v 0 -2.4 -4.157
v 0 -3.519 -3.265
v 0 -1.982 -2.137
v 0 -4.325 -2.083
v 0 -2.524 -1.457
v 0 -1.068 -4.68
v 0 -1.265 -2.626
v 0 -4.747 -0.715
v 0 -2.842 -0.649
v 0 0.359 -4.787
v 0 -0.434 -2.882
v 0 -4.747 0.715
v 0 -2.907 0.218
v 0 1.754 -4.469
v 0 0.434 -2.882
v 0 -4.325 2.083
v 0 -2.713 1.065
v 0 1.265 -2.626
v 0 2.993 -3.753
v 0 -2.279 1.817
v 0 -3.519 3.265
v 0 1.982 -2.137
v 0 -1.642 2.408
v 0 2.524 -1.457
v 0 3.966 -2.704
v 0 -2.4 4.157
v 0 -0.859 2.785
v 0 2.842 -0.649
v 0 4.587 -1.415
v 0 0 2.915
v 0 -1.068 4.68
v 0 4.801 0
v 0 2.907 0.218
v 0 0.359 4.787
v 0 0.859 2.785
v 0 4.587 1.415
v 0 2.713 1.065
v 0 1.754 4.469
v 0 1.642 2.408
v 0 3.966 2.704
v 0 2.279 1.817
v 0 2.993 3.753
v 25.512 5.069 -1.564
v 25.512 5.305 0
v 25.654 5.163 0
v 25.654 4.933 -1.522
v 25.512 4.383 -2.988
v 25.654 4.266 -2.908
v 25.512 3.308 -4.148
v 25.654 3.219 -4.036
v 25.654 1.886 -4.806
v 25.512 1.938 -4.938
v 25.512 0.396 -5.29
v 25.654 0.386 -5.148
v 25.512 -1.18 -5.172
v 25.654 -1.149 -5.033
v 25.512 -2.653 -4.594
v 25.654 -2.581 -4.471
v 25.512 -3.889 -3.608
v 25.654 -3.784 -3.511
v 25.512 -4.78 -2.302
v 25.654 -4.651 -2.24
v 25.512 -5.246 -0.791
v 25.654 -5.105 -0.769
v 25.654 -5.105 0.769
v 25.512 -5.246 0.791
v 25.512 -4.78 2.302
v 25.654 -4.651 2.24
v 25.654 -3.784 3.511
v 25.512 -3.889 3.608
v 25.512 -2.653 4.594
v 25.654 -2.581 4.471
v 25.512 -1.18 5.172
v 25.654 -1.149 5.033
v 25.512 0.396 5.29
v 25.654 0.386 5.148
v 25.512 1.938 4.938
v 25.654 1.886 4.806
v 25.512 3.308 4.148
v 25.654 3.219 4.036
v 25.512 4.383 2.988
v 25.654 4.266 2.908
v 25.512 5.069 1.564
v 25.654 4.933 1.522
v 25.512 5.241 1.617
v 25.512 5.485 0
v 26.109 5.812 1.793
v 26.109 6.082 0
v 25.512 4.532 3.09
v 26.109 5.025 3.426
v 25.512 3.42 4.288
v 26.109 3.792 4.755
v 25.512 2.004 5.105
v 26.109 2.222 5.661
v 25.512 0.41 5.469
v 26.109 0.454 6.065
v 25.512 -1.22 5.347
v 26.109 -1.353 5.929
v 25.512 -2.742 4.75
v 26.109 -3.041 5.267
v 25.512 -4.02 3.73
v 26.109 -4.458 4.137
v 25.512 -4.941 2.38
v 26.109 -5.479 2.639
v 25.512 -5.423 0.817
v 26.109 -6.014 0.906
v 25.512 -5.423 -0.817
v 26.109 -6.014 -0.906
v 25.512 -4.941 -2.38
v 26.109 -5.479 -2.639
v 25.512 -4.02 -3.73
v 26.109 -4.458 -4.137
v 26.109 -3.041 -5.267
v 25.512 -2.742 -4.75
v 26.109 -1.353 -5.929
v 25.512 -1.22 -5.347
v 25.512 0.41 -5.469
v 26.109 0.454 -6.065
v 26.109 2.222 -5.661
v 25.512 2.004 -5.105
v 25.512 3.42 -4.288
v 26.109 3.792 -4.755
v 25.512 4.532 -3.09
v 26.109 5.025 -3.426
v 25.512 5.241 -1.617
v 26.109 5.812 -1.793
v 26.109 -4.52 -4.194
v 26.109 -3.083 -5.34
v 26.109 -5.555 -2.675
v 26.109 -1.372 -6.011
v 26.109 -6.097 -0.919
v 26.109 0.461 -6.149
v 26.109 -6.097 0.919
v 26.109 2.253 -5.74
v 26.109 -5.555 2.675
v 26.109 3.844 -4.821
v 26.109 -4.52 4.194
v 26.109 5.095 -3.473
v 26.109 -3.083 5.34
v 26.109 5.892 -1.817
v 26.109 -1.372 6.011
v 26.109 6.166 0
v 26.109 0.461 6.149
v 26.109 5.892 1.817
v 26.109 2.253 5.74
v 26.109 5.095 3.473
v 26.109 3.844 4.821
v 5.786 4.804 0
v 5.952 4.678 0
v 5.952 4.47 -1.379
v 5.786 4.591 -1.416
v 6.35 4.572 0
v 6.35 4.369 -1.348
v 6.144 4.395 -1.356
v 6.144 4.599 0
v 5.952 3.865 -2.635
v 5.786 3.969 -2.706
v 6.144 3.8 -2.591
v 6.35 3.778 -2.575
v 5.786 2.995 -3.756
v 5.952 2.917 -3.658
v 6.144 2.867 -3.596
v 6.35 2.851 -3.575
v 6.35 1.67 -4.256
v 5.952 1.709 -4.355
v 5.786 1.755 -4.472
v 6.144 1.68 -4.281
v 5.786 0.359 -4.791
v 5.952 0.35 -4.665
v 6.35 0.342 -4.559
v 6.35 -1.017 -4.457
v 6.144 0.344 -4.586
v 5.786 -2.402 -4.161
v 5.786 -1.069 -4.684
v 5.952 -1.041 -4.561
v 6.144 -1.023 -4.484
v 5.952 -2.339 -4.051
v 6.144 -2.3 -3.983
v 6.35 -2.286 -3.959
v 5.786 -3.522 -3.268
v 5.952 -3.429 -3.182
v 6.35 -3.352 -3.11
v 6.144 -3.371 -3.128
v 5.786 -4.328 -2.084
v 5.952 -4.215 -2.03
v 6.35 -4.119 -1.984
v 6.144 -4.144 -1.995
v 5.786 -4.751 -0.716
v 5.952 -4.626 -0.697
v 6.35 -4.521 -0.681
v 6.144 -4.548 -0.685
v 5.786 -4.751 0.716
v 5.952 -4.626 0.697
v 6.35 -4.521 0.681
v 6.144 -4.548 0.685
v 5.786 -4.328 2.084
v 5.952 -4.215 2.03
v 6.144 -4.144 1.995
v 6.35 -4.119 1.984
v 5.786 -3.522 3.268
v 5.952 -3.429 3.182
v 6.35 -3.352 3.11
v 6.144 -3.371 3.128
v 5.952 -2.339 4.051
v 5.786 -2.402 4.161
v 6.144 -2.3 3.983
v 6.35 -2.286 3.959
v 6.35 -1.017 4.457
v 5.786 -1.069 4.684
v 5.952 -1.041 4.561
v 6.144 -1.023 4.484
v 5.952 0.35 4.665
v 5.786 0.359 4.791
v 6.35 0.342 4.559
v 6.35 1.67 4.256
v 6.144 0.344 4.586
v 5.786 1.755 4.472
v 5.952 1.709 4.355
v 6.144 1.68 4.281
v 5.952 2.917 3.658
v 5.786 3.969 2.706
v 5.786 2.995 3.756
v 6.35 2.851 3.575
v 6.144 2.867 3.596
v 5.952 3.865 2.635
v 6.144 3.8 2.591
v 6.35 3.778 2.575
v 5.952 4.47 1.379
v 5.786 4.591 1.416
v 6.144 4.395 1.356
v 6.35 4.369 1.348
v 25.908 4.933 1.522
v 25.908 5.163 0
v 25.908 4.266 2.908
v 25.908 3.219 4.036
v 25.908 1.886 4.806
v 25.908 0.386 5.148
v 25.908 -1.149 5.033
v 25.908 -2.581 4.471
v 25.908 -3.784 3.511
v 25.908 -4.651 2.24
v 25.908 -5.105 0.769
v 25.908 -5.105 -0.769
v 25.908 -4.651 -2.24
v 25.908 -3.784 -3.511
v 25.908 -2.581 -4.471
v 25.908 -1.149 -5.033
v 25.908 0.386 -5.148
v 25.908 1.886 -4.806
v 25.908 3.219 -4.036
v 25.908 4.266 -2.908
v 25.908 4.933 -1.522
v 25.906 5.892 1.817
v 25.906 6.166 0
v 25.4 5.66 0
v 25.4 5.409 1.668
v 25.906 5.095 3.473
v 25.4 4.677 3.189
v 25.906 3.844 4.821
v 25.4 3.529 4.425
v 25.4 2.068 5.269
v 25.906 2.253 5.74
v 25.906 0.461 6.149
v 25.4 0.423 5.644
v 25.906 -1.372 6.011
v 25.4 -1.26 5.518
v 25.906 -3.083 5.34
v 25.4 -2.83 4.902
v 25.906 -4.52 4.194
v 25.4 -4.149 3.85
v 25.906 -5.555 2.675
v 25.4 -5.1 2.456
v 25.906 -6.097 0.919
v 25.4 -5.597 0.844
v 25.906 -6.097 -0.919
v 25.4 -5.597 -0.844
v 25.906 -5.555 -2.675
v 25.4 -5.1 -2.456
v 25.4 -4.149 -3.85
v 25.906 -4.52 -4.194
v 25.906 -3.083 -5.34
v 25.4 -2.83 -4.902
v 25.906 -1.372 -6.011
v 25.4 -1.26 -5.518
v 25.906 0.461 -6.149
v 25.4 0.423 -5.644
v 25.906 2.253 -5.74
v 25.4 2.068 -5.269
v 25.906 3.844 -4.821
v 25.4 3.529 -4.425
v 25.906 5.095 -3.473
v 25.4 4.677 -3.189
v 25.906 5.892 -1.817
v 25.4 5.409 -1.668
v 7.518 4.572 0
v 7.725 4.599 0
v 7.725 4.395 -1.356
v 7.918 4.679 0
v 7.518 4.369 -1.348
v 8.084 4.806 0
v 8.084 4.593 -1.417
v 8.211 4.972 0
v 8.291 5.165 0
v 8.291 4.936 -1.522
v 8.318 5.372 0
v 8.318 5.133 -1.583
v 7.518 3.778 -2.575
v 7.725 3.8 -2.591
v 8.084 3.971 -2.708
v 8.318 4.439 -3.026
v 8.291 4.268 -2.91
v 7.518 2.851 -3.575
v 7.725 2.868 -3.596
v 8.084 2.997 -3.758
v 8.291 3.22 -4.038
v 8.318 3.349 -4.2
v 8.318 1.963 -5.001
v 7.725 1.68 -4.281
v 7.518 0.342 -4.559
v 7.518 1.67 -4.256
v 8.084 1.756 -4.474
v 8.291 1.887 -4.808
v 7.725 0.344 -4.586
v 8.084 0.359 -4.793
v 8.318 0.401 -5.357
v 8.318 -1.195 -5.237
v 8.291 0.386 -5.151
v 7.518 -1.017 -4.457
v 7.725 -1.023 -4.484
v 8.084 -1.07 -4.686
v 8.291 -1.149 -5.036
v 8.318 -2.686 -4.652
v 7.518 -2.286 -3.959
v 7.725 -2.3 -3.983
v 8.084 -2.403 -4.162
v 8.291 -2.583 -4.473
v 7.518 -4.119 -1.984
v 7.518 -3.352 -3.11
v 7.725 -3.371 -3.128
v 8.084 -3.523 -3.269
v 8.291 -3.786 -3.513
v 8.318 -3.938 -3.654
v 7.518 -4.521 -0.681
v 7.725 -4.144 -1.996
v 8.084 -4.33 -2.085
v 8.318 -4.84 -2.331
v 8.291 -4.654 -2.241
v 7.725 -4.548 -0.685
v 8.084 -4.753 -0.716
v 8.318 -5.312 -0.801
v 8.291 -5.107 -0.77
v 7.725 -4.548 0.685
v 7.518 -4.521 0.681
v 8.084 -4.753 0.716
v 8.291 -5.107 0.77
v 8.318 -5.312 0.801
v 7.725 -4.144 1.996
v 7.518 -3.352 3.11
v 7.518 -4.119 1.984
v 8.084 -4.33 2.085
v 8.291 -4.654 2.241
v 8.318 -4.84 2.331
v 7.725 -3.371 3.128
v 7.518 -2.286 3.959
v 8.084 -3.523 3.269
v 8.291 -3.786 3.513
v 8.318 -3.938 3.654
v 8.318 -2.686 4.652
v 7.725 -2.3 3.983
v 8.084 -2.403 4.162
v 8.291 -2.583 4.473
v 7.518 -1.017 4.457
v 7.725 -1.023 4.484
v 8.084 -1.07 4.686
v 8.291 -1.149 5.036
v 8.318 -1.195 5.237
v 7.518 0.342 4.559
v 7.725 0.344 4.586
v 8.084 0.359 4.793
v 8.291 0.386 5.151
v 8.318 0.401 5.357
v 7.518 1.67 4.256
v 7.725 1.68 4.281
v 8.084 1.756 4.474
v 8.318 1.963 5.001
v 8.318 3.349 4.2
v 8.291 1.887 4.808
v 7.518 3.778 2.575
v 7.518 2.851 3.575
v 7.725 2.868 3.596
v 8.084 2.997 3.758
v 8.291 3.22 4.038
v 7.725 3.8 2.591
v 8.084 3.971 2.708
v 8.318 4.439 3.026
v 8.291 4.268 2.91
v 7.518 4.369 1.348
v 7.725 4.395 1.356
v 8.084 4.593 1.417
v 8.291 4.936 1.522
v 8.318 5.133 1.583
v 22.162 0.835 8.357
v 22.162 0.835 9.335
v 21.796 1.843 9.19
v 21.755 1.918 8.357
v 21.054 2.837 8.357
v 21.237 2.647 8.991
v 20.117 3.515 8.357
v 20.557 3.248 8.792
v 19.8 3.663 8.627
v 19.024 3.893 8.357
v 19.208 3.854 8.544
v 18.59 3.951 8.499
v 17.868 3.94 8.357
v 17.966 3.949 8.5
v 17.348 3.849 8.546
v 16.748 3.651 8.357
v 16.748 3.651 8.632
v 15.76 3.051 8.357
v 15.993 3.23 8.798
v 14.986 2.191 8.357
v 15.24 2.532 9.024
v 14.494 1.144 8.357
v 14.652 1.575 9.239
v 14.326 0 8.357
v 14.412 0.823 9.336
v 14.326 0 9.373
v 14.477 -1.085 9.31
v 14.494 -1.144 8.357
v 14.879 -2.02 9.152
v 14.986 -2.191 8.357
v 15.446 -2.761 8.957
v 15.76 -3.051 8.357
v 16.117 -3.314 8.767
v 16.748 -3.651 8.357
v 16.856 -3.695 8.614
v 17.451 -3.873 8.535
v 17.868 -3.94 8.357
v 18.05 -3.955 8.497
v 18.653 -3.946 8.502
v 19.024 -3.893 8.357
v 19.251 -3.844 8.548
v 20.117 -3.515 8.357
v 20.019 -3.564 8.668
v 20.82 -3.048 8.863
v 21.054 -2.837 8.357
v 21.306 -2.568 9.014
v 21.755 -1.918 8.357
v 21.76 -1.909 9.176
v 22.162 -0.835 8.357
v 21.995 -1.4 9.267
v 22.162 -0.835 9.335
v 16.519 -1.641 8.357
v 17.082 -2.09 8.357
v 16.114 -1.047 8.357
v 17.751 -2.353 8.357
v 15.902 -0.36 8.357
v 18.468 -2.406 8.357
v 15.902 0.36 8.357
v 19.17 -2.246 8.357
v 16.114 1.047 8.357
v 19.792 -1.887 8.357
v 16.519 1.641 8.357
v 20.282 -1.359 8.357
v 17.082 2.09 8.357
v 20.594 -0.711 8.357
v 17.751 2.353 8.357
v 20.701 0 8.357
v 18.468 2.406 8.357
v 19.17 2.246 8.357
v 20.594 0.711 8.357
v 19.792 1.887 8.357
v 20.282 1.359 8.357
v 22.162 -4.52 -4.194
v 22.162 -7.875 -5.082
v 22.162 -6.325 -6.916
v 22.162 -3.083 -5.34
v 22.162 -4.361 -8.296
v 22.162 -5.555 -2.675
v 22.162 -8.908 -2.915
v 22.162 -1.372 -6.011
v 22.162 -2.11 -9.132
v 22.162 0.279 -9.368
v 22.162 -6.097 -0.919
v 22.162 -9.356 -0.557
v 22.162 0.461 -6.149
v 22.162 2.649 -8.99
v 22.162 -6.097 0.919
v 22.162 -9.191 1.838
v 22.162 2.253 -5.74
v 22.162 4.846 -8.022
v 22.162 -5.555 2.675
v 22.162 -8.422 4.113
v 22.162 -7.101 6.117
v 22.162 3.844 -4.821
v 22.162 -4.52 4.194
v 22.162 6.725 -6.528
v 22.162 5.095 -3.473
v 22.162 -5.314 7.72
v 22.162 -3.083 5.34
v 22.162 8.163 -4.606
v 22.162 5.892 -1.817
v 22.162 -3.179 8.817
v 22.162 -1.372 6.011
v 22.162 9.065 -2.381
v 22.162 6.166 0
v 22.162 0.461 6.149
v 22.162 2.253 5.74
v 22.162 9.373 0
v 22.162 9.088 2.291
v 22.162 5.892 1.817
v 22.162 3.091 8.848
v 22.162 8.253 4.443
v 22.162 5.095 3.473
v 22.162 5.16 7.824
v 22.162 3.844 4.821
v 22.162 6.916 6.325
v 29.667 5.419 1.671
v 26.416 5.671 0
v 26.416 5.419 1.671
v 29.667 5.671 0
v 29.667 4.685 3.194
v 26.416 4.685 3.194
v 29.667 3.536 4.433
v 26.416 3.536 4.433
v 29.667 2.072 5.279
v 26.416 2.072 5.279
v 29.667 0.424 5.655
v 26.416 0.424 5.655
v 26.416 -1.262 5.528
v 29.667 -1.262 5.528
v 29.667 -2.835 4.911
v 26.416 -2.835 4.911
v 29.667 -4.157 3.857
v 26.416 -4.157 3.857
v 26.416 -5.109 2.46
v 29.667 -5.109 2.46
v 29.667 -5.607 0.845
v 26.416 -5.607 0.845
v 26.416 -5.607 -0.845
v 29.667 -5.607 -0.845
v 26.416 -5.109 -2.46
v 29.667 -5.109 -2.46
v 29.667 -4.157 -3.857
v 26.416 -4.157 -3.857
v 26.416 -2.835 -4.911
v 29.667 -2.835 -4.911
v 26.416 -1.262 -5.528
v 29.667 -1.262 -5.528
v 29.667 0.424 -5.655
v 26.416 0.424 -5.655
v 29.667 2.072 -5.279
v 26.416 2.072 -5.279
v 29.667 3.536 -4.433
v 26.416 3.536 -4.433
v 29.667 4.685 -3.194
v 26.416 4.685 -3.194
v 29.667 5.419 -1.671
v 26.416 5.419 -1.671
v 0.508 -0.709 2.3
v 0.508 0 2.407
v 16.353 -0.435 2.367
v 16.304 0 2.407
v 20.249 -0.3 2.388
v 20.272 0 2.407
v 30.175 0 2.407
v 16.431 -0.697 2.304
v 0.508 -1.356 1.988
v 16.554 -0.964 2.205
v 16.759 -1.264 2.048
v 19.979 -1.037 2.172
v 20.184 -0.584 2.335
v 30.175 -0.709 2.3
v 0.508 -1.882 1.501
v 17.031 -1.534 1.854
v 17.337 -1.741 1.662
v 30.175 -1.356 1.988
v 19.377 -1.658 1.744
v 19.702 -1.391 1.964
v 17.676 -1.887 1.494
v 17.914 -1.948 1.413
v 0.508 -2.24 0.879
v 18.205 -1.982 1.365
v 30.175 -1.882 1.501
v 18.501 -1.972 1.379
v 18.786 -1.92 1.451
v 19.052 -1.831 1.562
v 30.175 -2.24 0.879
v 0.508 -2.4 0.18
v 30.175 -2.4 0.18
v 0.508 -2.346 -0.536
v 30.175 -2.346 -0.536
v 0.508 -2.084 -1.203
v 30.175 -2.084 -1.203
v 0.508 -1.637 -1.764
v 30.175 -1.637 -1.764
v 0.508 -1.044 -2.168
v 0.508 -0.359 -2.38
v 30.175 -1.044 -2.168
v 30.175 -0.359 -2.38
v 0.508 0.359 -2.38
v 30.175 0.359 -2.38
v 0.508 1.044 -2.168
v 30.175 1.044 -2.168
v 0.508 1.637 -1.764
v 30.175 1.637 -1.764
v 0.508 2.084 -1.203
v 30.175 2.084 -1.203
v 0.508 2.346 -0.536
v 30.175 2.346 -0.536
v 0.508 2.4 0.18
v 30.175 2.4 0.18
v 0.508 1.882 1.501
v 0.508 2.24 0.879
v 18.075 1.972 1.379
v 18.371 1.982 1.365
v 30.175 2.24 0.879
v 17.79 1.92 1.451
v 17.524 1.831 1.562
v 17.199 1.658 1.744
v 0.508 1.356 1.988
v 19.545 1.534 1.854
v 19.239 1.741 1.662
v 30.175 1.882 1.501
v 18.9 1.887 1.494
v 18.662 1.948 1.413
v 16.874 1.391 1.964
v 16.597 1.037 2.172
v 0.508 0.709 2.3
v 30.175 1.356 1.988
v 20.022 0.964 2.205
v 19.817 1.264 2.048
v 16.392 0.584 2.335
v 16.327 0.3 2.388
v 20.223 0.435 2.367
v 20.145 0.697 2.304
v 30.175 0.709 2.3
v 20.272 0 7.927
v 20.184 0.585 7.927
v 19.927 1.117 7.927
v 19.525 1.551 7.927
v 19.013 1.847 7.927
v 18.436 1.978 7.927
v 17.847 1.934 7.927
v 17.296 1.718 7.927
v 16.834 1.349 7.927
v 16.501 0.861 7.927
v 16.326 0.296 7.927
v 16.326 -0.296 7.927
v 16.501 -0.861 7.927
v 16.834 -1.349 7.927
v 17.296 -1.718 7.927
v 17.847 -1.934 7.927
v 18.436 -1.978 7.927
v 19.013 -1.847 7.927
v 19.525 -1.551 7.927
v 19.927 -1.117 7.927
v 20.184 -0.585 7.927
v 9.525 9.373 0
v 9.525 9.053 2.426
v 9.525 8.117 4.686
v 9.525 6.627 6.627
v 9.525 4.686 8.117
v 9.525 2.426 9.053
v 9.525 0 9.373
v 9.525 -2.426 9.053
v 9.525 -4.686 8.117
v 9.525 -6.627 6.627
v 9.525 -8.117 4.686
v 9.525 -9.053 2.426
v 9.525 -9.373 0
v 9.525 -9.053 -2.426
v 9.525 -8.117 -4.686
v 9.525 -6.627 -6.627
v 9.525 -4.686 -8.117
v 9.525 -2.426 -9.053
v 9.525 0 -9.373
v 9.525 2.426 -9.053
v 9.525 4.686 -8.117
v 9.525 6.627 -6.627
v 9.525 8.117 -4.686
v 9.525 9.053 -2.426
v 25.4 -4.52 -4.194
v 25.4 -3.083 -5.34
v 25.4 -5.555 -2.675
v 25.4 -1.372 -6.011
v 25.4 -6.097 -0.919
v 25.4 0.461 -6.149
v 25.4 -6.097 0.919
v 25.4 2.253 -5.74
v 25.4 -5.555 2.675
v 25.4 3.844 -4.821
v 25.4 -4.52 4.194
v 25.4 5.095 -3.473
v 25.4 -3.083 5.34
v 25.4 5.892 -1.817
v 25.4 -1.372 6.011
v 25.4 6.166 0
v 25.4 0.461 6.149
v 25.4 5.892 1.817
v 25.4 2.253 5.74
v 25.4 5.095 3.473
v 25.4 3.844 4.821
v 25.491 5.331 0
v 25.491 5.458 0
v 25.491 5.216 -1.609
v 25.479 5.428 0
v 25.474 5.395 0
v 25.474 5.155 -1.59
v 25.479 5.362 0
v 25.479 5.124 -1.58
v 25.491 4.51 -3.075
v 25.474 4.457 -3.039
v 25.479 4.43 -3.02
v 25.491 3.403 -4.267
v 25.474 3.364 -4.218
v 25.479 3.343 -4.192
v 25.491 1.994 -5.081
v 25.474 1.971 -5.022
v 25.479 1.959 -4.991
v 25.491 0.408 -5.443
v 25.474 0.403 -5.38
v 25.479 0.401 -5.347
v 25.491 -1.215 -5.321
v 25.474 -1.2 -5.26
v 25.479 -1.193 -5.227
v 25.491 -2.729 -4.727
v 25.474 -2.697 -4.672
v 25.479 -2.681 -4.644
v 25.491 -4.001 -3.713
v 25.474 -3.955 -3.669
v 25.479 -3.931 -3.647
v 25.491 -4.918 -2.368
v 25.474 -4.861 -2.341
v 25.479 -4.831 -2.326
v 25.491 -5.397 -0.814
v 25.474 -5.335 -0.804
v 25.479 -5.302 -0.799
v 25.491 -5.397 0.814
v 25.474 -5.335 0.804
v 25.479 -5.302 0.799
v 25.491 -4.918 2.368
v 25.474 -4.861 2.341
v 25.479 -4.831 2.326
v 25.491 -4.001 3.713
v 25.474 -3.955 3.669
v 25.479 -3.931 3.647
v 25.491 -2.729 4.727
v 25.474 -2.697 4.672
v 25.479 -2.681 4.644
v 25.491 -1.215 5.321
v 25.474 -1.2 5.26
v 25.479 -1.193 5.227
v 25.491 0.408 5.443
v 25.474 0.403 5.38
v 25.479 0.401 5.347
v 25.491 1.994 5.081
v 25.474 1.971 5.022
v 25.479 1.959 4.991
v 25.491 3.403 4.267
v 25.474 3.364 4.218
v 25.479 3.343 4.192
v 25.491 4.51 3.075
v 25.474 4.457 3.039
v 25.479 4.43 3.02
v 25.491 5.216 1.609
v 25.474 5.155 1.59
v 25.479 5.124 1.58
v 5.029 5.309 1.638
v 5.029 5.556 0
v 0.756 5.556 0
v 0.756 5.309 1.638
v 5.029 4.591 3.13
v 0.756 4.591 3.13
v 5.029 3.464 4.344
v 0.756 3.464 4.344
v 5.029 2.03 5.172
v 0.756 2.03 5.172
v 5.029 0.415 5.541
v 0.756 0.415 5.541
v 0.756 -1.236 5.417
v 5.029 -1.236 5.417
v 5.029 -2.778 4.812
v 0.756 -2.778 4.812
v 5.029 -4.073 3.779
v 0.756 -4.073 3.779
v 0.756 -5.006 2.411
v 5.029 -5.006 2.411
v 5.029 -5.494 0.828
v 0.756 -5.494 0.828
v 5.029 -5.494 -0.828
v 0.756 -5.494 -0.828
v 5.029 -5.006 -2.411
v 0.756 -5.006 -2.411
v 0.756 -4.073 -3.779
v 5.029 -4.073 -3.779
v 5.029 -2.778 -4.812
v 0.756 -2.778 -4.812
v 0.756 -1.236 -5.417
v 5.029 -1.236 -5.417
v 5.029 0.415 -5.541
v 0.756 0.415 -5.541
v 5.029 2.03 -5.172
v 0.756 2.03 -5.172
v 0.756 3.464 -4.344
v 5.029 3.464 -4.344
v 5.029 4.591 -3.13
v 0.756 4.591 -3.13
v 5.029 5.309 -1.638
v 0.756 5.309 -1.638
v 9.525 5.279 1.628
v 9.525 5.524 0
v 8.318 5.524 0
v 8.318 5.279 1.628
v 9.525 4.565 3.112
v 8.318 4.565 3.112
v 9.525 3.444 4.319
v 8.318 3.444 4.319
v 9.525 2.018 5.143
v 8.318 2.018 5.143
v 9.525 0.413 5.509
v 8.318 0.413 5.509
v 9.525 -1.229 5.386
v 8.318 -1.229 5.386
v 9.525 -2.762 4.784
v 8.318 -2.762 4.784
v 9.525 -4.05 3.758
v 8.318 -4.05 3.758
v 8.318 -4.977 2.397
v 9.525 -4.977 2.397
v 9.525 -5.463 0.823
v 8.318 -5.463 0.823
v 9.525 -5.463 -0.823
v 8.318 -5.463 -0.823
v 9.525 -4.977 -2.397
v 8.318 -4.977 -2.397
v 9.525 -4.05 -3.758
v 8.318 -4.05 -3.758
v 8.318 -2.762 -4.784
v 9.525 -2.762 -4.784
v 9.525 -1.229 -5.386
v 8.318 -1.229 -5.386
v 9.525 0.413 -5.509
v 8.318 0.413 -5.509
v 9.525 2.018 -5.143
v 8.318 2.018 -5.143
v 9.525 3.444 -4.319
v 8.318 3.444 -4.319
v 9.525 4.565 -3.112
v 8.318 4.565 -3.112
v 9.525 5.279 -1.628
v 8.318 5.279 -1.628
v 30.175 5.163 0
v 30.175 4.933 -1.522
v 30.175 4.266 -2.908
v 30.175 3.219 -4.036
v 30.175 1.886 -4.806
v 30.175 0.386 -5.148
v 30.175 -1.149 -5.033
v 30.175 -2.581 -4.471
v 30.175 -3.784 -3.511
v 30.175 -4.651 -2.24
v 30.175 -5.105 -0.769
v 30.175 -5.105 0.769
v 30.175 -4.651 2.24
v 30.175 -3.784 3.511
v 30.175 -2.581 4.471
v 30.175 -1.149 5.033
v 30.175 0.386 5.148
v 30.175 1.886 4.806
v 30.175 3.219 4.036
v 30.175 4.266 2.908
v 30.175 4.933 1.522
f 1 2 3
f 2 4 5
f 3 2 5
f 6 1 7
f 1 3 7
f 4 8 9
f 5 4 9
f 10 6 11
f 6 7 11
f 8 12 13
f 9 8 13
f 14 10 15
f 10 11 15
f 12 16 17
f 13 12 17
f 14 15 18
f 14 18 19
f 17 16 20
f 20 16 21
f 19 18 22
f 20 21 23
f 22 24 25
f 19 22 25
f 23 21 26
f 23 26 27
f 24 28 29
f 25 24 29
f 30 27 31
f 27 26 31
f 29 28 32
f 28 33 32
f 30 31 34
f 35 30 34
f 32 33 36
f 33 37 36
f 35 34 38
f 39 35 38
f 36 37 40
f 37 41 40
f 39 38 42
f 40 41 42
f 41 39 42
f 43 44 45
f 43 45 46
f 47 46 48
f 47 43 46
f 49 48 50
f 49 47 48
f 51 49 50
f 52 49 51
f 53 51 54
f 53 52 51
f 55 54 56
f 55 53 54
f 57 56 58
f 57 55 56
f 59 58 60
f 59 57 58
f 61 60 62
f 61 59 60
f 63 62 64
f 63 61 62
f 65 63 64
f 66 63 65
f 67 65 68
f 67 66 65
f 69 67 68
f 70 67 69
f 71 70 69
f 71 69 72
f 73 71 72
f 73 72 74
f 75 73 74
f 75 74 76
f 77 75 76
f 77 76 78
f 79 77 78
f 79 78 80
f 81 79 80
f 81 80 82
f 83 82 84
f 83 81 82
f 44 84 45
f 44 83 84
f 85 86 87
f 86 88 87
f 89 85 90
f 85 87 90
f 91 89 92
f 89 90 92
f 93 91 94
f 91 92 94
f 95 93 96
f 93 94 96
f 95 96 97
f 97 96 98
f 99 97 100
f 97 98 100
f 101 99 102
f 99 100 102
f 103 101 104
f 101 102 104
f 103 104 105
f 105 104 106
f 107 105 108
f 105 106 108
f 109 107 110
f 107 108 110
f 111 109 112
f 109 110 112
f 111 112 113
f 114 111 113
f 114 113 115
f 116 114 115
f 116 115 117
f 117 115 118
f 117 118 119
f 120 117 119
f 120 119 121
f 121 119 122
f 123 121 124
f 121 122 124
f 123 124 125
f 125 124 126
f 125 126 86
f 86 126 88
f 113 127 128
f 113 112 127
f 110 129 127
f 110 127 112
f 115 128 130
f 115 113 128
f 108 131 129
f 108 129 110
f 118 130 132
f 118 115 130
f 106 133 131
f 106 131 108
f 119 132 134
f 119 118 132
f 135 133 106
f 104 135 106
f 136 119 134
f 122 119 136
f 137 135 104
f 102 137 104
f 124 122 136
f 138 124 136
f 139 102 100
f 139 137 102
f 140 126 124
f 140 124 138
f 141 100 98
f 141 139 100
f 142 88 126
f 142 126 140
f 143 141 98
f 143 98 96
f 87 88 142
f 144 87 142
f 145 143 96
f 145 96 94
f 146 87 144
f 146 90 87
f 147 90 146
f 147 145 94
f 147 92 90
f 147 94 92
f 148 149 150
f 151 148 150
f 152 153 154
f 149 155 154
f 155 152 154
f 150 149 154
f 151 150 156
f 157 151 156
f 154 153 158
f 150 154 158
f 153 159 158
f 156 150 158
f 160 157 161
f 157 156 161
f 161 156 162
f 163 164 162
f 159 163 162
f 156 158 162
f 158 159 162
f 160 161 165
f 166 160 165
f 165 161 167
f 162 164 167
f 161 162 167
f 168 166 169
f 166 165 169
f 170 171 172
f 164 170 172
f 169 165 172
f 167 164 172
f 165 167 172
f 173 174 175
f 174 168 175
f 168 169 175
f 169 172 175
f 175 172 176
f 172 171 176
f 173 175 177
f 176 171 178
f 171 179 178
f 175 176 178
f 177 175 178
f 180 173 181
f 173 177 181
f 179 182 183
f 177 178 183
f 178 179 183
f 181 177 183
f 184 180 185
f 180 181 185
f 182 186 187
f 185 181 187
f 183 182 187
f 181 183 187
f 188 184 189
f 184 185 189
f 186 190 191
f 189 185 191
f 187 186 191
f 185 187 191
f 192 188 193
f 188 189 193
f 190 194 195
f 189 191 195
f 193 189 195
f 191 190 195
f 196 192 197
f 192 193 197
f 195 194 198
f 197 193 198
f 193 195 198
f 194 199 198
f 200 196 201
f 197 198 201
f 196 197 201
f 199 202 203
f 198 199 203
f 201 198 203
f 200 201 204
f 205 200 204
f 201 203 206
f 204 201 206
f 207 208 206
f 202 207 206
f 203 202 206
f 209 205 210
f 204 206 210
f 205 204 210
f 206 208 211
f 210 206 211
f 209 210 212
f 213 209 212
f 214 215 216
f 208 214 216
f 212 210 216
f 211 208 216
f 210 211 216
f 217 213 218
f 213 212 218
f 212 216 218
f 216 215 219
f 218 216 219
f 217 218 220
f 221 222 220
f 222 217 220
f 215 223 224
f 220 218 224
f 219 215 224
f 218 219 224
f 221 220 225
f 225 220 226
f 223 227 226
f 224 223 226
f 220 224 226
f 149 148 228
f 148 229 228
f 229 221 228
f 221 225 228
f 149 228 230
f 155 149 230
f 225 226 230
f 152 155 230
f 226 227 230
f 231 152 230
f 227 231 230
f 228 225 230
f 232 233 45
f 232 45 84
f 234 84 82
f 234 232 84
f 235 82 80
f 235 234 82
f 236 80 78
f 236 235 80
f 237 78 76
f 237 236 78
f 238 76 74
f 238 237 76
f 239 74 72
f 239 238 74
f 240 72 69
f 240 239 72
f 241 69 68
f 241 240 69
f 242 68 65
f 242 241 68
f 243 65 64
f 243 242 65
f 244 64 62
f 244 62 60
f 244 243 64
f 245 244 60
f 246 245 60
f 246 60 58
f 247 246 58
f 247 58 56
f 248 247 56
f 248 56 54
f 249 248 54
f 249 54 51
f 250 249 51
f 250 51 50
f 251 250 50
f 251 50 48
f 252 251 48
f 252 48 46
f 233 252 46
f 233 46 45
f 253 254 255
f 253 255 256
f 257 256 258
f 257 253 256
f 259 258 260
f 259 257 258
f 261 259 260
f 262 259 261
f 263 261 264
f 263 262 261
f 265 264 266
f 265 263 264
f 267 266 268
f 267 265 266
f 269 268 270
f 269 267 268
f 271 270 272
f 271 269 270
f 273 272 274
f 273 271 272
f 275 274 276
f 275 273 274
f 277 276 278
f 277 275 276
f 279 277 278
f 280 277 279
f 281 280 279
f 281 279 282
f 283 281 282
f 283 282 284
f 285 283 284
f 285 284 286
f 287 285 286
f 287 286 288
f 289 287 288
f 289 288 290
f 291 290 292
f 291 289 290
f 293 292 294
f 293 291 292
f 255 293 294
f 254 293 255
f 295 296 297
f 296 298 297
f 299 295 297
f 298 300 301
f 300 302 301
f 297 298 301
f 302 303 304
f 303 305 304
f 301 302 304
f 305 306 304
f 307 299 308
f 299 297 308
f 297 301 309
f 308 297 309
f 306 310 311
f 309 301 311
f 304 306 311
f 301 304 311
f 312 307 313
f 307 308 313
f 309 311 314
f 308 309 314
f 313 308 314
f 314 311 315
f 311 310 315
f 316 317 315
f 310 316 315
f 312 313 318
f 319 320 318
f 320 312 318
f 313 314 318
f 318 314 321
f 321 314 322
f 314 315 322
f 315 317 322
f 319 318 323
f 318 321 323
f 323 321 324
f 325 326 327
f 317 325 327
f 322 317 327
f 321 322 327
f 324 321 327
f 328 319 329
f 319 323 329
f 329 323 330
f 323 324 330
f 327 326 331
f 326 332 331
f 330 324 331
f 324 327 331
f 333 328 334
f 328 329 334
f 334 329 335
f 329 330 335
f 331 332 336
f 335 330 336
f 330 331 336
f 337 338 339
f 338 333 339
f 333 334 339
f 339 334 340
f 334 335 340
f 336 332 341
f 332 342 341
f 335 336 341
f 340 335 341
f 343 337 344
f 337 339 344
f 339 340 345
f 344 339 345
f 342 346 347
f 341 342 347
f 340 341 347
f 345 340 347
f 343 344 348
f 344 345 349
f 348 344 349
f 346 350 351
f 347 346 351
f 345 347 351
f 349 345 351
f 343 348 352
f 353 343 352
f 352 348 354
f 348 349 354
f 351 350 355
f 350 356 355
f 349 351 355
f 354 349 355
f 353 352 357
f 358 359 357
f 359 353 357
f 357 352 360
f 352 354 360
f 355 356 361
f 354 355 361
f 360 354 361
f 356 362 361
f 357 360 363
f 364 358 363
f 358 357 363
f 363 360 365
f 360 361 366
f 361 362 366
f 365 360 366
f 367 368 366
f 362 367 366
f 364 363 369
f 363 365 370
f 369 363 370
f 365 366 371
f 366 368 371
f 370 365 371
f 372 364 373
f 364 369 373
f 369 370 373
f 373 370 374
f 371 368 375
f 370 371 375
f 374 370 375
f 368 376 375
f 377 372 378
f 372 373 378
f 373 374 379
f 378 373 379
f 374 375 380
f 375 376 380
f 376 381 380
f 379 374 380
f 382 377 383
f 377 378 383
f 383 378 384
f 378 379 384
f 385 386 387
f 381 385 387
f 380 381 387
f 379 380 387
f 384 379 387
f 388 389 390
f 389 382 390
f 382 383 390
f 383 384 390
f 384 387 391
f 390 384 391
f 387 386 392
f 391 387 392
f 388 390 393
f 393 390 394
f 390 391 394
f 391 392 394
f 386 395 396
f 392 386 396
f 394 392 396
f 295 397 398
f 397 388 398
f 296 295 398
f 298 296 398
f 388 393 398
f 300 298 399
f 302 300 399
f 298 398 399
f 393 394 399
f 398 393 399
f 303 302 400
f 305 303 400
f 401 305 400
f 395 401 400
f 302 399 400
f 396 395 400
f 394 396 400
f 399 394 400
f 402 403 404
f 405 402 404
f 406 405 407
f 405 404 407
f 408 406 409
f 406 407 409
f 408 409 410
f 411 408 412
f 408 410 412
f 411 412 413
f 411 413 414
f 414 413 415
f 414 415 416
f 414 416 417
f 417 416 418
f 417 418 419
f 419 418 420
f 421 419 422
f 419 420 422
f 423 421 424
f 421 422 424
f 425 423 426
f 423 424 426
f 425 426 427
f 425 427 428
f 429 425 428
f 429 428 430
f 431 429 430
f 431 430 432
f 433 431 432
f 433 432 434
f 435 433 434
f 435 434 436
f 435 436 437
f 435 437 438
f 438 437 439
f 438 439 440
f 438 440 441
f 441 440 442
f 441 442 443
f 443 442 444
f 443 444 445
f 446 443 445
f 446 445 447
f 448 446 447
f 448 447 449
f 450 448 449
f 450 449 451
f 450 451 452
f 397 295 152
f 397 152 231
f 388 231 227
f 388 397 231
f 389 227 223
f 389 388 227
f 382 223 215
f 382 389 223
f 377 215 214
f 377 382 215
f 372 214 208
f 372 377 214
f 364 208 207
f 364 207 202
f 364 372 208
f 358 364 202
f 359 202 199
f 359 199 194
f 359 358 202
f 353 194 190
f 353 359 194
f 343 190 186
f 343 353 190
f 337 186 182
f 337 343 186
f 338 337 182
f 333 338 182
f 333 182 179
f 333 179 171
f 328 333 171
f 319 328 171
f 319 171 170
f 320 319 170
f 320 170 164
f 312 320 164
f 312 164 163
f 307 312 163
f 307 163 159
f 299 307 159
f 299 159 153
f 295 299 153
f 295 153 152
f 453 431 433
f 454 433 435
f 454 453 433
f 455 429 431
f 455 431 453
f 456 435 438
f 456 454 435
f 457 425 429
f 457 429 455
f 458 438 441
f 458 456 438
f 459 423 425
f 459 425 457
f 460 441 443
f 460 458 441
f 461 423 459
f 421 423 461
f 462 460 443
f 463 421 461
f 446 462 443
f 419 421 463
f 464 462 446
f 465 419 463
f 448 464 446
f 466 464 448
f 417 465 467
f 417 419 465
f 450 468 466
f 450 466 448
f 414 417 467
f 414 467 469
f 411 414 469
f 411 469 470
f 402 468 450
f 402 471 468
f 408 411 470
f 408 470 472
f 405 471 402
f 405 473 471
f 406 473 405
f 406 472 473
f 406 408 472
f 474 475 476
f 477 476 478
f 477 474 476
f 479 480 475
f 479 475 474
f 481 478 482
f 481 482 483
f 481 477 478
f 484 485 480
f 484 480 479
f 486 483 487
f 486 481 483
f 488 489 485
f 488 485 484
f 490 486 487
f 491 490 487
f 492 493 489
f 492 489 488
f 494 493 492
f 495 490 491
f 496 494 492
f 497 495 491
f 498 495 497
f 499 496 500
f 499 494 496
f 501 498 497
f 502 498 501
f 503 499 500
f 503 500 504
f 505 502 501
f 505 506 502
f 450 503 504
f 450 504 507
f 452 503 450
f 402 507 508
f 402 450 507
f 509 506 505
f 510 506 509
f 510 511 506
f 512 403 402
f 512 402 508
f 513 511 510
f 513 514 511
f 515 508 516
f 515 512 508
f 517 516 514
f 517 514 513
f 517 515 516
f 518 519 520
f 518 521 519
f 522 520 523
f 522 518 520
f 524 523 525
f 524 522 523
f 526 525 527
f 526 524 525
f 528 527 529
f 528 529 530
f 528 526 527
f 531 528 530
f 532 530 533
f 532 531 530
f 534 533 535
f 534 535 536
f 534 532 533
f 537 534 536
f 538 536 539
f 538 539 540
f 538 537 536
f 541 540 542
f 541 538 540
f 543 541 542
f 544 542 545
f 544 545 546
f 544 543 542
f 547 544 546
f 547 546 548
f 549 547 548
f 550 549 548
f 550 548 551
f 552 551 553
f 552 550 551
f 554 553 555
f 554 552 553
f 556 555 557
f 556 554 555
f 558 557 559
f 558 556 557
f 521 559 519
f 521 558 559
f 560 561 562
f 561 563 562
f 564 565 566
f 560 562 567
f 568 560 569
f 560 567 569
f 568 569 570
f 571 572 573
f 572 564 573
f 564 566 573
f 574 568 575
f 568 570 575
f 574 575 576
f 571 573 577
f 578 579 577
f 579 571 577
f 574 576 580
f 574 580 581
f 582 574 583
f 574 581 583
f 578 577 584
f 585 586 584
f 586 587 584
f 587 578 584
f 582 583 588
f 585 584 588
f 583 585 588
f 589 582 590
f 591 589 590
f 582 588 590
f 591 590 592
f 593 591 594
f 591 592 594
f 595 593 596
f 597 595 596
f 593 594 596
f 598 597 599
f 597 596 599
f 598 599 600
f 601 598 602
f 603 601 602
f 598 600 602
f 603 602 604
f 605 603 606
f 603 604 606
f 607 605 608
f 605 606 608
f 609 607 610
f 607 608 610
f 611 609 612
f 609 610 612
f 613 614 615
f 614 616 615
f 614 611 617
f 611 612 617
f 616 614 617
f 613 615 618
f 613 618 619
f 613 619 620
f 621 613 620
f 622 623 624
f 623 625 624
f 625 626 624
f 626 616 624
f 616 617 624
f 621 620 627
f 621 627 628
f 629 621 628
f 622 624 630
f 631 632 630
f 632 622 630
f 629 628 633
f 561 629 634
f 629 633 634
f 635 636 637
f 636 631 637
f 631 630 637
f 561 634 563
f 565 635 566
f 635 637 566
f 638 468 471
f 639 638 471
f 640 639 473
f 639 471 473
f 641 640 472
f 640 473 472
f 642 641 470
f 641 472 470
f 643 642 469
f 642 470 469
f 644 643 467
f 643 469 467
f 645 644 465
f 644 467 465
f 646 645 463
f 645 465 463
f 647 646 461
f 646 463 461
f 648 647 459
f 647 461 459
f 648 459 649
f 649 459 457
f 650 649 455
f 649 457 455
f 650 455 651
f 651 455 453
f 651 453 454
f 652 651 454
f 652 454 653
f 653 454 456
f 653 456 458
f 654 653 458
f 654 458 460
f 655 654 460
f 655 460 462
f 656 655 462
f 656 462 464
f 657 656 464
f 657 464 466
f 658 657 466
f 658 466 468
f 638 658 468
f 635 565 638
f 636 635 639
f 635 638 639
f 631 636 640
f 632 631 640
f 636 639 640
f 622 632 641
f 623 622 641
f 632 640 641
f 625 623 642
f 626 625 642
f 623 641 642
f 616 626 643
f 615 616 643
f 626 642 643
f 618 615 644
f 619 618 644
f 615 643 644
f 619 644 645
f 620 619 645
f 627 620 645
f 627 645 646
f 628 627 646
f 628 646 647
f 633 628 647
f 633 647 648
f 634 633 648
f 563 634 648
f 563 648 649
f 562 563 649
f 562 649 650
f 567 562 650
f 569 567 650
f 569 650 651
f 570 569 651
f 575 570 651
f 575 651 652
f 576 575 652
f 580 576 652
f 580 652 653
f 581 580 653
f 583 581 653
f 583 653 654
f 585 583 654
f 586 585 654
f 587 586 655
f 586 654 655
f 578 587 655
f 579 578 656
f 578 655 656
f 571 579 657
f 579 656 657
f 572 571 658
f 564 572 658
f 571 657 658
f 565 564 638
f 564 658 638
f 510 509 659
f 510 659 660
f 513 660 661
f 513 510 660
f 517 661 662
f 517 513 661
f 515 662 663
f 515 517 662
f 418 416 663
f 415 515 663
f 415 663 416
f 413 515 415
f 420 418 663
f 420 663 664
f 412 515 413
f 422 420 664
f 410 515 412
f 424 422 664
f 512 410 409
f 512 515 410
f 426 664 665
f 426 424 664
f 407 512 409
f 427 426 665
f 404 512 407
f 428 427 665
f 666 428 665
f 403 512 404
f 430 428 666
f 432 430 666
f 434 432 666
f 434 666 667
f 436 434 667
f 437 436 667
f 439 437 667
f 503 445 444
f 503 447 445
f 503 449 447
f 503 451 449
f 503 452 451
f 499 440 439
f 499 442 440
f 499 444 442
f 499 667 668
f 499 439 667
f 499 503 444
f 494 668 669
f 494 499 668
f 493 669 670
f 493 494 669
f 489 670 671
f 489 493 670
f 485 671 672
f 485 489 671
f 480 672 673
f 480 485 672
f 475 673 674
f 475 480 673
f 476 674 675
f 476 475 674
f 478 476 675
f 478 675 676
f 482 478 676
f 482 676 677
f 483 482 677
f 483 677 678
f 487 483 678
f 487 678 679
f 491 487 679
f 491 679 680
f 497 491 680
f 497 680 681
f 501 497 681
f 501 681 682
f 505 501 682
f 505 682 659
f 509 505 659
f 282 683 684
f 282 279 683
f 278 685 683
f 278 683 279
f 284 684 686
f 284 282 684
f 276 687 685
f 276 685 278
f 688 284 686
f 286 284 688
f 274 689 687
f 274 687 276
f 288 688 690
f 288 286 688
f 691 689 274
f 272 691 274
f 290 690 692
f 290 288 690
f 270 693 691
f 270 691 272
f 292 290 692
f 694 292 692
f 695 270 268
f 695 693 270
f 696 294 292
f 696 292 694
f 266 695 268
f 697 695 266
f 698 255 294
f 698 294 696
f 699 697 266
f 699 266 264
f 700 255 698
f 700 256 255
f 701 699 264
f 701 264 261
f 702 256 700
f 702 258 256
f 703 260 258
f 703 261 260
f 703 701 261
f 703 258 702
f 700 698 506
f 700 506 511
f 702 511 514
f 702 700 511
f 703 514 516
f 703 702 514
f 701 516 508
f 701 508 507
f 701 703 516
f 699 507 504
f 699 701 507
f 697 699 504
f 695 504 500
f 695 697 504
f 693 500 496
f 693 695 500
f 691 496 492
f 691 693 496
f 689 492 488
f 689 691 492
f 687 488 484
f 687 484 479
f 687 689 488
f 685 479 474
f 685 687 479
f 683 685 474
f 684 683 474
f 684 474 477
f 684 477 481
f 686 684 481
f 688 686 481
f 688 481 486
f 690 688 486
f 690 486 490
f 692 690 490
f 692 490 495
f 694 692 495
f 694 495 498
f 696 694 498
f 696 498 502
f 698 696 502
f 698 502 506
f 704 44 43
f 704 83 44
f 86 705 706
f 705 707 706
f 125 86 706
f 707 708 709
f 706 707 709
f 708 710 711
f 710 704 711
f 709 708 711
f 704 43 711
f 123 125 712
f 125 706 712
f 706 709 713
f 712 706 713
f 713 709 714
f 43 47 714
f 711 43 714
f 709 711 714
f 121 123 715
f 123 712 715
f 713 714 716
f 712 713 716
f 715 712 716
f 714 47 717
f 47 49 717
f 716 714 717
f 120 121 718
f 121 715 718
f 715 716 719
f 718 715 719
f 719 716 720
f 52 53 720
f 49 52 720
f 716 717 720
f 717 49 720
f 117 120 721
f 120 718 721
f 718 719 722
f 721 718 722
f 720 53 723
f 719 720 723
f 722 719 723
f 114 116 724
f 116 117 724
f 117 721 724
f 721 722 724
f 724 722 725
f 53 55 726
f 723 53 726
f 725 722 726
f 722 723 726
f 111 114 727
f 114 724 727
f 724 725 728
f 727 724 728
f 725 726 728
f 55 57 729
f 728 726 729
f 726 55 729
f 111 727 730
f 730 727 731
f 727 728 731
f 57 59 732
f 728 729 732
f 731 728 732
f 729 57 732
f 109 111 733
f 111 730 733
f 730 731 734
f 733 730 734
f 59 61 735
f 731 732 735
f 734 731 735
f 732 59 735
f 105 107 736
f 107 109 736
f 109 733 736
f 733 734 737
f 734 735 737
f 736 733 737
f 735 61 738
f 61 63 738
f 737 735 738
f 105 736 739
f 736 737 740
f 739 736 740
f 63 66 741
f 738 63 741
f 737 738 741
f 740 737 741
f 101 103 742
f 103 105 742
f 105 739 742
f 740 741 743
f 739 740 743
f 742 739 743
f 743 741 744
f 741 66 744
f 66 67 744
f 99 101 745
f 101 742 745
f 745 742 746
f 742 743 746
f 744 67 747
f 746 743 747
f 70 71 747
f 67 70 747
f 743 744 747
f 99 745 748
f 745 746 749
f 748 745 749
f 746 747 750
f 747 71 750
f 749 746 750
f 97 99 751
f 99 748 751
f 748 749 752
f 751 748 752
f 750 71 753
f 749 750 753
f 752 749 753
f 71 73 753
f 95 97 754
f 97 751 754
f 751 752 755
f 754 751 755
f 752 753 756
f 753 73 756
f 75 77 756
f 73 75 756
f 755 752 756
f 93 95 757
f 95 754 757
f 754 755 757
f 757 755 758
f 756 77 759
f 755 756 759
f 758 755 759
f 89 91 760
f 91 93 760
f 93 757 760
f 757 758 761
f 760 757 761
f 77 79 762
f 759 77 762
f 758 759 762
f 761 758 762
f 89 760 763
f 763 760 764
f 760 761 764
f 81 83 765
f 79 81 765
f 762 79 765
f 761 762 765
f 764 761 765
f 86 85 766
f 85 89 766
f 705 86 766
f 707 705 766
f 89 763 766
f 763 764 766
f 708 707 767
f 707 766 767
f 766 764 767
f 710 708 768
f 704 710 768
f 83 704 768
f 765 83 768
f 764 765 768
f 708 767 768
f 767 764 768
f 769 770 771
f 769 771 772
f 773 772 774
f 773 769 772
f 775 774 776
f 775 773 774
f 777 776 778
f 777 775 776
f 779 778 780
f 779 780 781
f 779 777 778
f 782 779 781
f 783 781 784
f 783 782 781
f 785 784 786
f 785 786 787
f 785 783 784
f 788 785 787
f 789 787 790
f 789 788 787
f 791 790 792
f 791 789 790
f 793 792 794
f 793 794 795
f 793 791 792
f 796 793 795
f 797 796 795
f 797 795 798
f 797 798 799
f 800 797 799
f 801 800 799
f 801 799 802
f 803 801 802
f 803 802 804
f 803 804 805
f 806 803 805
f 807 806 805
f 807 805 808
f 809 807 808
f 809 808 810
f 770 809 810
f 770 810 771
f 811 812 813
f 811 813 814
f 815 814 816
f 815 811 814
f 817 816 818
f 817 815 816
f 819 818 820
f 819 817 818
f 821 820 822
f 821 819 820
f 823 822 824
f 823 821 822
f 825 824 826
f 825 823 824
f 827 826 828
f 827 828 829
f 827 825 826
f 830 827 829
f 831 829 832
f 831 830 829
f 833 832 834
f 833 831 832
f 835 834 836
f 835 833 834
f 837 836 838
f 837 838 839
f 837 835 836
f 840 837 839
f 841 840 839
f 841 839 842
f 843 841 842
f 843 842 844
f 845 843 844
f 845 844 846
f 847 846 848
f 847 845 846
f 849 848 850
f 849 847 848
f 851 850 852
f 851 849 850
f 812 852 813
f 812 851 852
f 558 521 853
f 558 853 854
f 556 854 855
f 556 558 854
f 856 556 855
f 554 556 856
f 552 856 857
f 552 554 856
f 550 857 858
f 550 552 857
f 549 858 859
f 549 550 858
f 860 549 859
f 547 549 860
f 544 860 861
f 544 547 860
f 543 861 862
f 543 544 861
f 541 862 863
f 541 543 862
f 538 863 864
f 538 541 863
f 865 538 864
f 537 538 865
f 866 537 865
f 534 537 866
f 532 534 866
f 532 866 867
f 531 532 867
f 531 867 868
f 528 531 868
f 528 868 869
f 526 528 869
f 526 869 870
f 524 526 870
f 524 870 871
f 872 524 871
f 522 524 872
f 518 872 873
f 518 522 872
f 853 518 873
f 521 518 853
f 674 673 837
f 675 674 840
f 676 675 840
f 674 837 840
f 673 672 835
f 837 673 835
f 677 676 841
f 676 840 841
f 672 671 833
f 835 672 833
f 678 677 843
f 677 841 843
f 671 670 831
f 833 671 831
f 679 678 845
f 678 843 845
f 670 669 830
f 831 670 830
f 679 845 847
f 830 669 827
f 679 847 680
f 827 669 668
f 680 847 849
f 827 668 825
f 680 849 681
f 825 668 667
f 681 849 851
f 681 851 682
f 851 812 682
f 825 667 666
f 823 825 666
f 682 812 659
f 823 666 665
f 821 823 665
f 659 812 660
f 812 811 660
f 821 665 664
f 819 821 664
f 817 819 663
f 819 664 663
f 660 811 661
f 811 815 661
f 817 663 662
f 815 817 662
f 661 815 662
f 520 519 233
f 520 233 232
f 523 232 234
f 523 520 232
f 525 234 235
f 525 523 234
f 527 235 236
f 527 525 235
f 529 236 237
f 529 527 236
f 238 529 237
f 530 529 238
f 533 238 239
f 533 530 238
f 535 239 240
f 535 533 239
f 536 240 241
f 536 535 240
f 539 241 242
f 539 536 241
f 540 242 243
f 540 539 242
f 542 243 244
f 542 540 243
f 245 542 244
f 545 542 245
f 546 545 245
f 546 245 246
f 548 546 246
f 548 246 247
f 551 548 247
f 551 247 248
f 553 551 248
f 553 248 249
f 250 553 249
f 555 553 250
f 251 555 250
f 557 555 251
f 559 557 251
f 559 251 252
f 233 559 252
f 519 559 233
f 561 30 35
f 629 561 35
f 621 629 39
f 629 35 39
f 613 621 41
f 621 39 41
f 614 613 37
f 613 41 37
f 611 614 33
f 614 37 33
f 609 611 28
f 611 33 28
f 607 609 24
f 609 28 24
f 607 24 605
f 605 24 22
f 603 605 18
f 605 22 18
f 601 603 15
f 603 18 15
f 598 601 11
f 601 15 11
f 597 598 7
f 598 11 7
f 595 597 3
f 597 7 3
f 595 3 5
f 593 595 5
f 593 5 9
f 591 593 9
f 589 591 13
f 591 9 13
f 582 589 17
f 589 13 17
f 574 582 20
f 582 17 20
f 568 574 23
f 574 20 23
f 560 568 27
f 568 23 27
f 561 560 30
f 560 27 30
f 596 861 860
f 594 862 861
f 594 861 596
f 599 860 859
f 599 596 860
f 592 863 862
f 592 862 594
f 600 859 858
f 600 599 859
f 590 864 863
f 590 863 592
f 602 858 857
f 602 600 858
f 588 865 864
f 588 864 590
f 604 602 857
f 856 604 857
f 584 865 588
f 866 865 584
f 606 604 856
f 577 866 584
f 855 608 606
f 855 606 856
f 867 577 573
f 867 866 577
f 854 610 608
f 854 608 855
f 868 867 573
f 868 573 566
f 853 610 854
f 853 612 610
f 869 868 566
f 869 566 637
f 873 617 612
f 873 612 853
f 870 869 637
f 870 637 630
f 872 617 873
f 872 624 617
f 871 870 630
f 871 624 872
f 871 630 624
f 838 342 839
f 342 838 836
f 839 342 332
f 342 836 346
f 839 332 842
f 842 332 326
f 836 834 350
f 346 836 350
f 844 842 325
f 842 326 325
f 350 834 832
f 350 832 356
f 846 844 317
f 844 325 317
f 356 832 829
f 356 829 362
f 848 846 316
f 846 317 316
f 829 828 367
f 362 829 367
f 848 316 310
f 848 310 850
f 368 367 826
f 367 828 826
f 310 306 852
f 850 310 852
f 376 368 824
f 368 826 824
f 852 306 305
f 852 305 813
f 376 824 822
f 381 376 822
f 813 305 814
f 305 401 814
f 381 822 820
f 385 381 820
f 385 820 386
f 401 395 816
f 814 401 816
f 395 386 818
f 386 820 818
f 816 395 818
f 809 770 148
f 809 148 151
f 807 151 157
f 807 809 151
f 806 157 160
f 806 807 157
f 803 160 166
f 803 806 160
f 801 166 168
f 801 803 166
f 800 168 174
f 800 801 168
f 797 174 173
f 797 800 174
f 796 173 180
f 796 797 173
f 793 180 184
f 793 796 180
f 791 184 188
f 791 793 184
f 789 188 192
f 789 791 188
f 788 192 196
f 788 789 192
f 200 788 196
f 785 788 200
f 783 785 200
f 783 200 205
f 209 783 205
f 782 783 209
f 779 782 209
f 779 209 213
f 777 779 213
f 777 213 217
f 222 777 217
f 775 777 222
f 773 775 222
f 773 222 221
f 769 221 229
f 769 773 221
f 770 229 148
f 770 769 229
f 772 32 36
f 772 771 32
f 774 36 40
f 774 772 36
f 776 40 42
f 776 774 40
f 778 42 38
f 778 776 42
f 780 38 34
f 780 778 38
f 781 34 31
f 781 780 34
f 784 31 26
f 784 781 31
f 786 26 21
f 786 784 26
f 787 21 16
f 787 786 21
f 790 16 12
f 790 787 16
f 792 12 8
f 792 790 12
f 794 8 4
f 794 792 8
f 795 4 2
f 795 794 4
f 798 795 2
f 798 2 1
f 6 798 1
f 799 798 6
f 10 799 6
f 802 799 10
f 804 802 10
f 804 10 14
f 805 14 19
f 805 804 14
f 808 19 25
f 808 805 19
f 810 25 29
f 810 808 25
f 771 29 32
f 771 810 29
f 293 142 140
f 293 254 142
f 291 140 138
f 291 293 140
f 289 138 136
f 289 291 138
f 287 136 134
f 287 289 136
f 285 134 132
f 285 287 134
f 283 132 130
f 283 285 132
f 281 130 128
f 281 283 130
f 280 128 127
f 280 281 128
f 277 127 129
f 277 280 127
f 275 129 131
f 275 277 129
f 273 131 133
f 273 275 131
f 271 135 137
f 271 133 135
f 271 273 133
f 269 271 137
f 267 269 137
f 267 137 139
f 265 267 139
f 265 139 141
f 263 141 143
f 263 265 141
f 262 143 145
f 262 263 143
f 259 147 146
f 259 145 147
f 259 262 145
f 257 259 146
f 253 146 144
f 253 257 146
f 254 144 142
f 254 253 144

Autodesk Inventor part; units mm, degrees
sketch "Sketch_2" plane through (0, 0, 0) normal (0, 0, 1) x (1, 0, 0)
  line L0 (9.525, 0) -> (0, 0)
  line L1 (0, 0) -> (0, 4.8006)
  line L2 (0, 4.8006) -> (0.7557, 5.5563)
  line L3 (0.7557, 5.5563) -> (5.0286, 5.5563)
  line L4 (5.0286, 5.5563) -> (5.7864, 4.8042)
  arc A0 (5.7864, 4.8042) -> (6.35, 4.572) centre (6.35, 5.3721) ccw
  line L5 (6.35, 4.572) -> (7.5184, 4.572)
  arc A1 (7.5184, 4.572) -> (8.3185, 5.3721) centre (7.5184, 5.3721) ccw
  line L6 (8.3185, 5.3721) -> (8.3185, 5.5245)
  line L7 (8.3185, 5.5245) -> (9.525, 5.5245)
  line L8 (9.525, 5.5245) -> (9.525, 0)
  line L9 (9.525, 0) -> (0, 0)
revolve "Revolution1" add sketch "Sketch_2" angle 360 about axis through (9.525, 0, 0) along (1, 0, 0)
thread "Thread1" size "7/16-20 UNF" class "2A" standard "ANSI Unified Screw Threads" full length
sketch "Sketch_3" plane through (0, 0, 0) normal (0, 0, 1) x (1, 0, 0)
  line L0 (30.1752, 0) -> (9.525, 0)
  line L1 (9.525, 0) -> (9.525, 9.3726)
  line L2 (9.525, 9.3726) -> (25.4, 9.3726)
  line L3 (25.4, 9.3726) -> (25.4, 5.1626)
  line L4 (25.4, 5.1626) -> (25.908, 5.1626)
  line L5 (25.908, 5.1626) -> (26.416, 5.6706)
  line L6 (26.416, 5.6706) -> (29.6672, 5.6706)
  line L7 (29.6672, 5.6706) -> (30.1752, 5.1626)
  line L8 (30.1752, 5.1626) -> (30.1752, 0)
  line L9 (30.1752, 0) -> (9.525, 0)
revolve "Revolution2" add sketch "Sketch_3" angle 360 about axis through (30.1752, 0, 0) along (1, 0, 0)
sketch "Sketch3" plane through (0, 0, 0) normal (-1, 0, 0) x (0, 0, 1)
  point P0 (0, 0)
hole "Hole1" at (0, 0, 0) direction (1, 0, 0) diameter 4.8133 depth 30.1752 countersink diameter 5.8293 countersink angle 90
sketch "Sketch_12" plane through (0, 0, 0) normal (0, 1, 0) x (-1, 0, 0)
  line L0 (-18.288, 9.3726) -> (-18.288, -1.016)
  line L1 (-18.288, -1.016) -> (-20.2717, -1.016)
  line L2 (-20.2717, -1.016) -> (-20.2717, 7.9273)
  line L3 (-20.2717, 7.9273) -> (-20.701, 8.3566)
  line L4 (-20.701, 8.3566) -> (-22.2504, 8.3566)
  line L5 (-22.2504, 8.3566) -> (-22.2504, 9.3726)
  line L6 (-22.2504, 9.3726) -> (-18.288, 9.3726)
  line L7 (-18.288, 9.3726) -> (-18.288, -1.016)
revolve "Revolution3" cut sketch "Sketch_12" angle 360 about axis through (18.288, 0, 9.3726) along (0, 0, 1)
thread "Thread2" size "10-32 UNF" class "2B" standard "ANSI Unified Screw Threads" length 4.7752 offset 2.2188
sketch "Sketch_14" plane through (0, 0, 0) normal (0, 0, 1) x (1, 0, 0)
  line L0 (25.4, 0) -> (22.1615, 0)
  line L1 (22.1615, 6.1659) -> (25.4, 6.1659)
  line L2 (25.4, 6.1659) -> (25.4, 9.9758)
  line L3 (25.4, 9.9758) -> (22.1615, 9.9758)
  line L4 (22.1615, 9.9758) -> (22.1615, 6.1659)
revolve "Revolution4" cut sketch "Sketch_14" angle 360 about axis through (25.4, 0, 0) along (1, 0, 0)
sketch "Sketch_47" plane through (0, 0, 0) normal (0, 0, 1) x (1, 0, 0)
  line L0 (25.908, 0) -> (25.4, 0)
  line L1 (25.4, 4.9085) -> (25.908, 4.9085)
  line L2 (25.908, 4.9085) -> (25.908, 5.1626)
  line L3 (25.908, 5.1626) -> (25.654, 5.1626)
  line L4 (25.654, 5.1626) -> (25.5116, 5.305)
  arc A0 (25.5116, 5.4846) -> (25.5116, 5.305) centre (25.6014, 5.3948) ccw
  line L5 (25.5116, 5.4846) -> (26.1087, 6.0817)
  line L6 (26.1087, 6.0817) -> (26.1087, 6.1659)
  line L7 (26.1087, 6.1659) -> (25.9055, 6.1659)
  line L8 (25.9055, 6.1659) -> (25.4, 5.6603)
  line L9 (25.4, 5.6603) -> (25.4, 4.9085)
revolve "Revolution5" add sketch "Sketch_47" angle 360 about axis through (25.908, 0, 0) along (1, 0, 0)
ref_plane "dp1_XY" through (9.525, 5.5245, 0) normal (0, 0, 1) x (1, 0, 0)
ref_plane "dp1_YZ" through (9.525, 5.5245, 0) normal (1, 0, 0) x (0, 1, 0)
ref_plane "dp1_ZX" through (9.525, 5.5245, 0) normal (0, 1, 0) x (0, 0, 1)
ref_plane "dp2_XY" through (9.525, -5.5245, 0) normal (0, 0, 1) x (1, 0, 0)
ref_plane "dp2_YZ" through (9.525, -5.5245, 0) normal (1, 0, 0) x (0, 1, 0)
ref_plane "dp2_ZX" through (9.525, -5.5245, 0) normal (0, 1, 0) x (0, 0, 1)
ref_plane "port_XY" through (18.288, 0, 0) normal (0, 0, 1) x (1, 0, 0)
ref_plane "port_YZ" through (18.288, 0, 0) normal (1, 0, 0) x (0, 1, 0)
ref_plane "port_ZX" through (18.288, 0, 0) normal (0, 1, 0) x (0, 0, 1)
ref_plane "rod_guide_XY" through (0, 0, 0) normal (1, 0, 0) x (0, 0, -1)
ref_plane "rod_guide_YZ" through (0, 0, 0) normal (0, 0, -1) x (0, 1, 0)
ref_plane "rod_guide_ZX" through (0, 0, 0) normal (0, 1, 0) x (1, 0, 0)
ref_plane "s1_XY" through (8.3185, 0, 0) normal (0, 0, 1) x (1, 0, 0)
ref_plane "s1_YZ" through (8.3185, 0, 0) normal (1, 0, 0) x (0, 1, 0)
ref_plane "s1_ZX" through (8.3185, 0, 0) normal (0, 1, 0) x (0, 0, 1)
ref_plane "s2_XY" through (9.525, 0, 0) normal (0, 0, 1) x (1, 0, 0)
ref_plane "s2_YZ" through (9.525, 0, 0) normal (1, 0, 0) x (0, 1, 0)
ref_plane "s2_ZX" through (9.525, 0, 0) normal (0, 1, 0) x (0, 0, 1)
ref_plane "t1_XY" through (9.525, 0, 0) normal (1, 0, 0) x (0, 0, -1)
ref_plane "t1_YZ" through (9.525, 0, 0) normal (0, 0, -1) x (0, 1, 0)
ref_plane "t1_ZX" through (9.525, 0, 0) normal (0, 1, 0) x (1, 0, 0)
ref_plane "t111_XY" through (9.525, 0, 0) normal (1, 0, 0) x (0, 0, -1)
ref_plane "t111_YZ" through (9.525, 0, 0) normal (0, 0, -1) x (0, 1, 0)
ref_plane "t111_ZX" through (9.525, 0, 0) normal (0, 1, 0) x (1, 0, 0)
ref_plane "to_foot_bracket_XY" through (9.525, 0, 0) normal (1, 0, 0) x (0, 0, -1)
ref_plane "to_foot_bracket_YZ" through (9.525, 0, 0) normal (0, 0, -1) x (0, 1, 0)
ref_plane "to_foot_bracket_ZX" through (9.525, 0, 0) normal (0, 1, 0) x (1, 0, 0)
ref_plane "to_nut_XY" through (8.3185, 0, 0) normal (1, 0, 0) x (0, 0, -1)
ref_plane "to_nut_YZ" through (8.3185, 0, 0) normal (0, 0, -1) x (0, 1, 0)
ref_plane "to_nut_ZX" through (8.3185, 0, 0) normal (0, 1, 0) x (1, 0, 0)
ref_plane "to_rod_XY" through (0, 0, 0) normal (1, 0, 0) x (0, 0, -1)
ref_plane "to_rod_YZ" through (0, 0, 0) normal (0, 0, -1) x (0, 1, 0)
ref_plane "to_rod_ZX" through (0, 0, 0) normal (0, 1, 0) x (1, 0, 0)
ref_plane "to_screw_XY" through (18.288, 0, 0) normal (0, 1, 0) x (1, 0, 0)
ref_plane "to_screw_YZ" through (18.288, 0, 0) normal (1, 0, 0) x (0, 0, -1)
ref_plane "to_screw_ZX" through (18.288, 0, 0) normal (0, 0, -1) x (0, 1, 0)
ref_plane "to_trunnion_brackets_XY" through (7.9248, 0, 0) normal (0, 1, 0) x (1, 0, 0)
ref_plane "to_trunnion_brackets_YZ" through (7.9248, 0, 0) normal (1, 0, 0) x (0, 0, -1)
ref_plane "to_trunnion_brackets_ZX" through (7.9248, 0, 0) normal (0, 0, -1) x (0, 1, 0)
ref_plane "to_trunnion_brackets1_XY" through (7.9248, 9.525, 0) normal (0, 1, 0) x (1, 0, 0)
ref_plane "to_trunnion_brackets1_YZ" through (7.9248, 9.525, 0) normal (1, 0, 0) x (0, 0, -1)
ref_plane "to_trunnion_brackets1_ZX" through (7.9248, 9.525, 0) normal (0, 0, -1) x (0, 1, 0)
ref_plane "to_trunnion_brackets2_XY" through (7.9248, -9.525, 0) normal (0, 1, 0) x (1, 0, 0)
ref_plane "to_trunnion_brackets2_YZ" through (7.9248, -9.525, 0) normal (1, 0, 0) x (0, 0, -1)
ref_plane "to_trunnion_brackets2_ZX" through (7.9248, -9.525, 0) normal (0, 0, -1) x (0, 1, 0)
ref_plane "to_tube_XY" through (25.908, 0, 0) normal (1, 0, 0) x (0, 0, -1)
ref_plane "to_tube_YZ" through (25.908, 0, 0) normal (0, 0, -1) x (0, 1, 0)
ref_plane "to_tube_ZX" through (25.908, 0, 0) normal (0, 1, 0) x (1, 0, 0)
properties part number "01R000-0_rod_guide"
